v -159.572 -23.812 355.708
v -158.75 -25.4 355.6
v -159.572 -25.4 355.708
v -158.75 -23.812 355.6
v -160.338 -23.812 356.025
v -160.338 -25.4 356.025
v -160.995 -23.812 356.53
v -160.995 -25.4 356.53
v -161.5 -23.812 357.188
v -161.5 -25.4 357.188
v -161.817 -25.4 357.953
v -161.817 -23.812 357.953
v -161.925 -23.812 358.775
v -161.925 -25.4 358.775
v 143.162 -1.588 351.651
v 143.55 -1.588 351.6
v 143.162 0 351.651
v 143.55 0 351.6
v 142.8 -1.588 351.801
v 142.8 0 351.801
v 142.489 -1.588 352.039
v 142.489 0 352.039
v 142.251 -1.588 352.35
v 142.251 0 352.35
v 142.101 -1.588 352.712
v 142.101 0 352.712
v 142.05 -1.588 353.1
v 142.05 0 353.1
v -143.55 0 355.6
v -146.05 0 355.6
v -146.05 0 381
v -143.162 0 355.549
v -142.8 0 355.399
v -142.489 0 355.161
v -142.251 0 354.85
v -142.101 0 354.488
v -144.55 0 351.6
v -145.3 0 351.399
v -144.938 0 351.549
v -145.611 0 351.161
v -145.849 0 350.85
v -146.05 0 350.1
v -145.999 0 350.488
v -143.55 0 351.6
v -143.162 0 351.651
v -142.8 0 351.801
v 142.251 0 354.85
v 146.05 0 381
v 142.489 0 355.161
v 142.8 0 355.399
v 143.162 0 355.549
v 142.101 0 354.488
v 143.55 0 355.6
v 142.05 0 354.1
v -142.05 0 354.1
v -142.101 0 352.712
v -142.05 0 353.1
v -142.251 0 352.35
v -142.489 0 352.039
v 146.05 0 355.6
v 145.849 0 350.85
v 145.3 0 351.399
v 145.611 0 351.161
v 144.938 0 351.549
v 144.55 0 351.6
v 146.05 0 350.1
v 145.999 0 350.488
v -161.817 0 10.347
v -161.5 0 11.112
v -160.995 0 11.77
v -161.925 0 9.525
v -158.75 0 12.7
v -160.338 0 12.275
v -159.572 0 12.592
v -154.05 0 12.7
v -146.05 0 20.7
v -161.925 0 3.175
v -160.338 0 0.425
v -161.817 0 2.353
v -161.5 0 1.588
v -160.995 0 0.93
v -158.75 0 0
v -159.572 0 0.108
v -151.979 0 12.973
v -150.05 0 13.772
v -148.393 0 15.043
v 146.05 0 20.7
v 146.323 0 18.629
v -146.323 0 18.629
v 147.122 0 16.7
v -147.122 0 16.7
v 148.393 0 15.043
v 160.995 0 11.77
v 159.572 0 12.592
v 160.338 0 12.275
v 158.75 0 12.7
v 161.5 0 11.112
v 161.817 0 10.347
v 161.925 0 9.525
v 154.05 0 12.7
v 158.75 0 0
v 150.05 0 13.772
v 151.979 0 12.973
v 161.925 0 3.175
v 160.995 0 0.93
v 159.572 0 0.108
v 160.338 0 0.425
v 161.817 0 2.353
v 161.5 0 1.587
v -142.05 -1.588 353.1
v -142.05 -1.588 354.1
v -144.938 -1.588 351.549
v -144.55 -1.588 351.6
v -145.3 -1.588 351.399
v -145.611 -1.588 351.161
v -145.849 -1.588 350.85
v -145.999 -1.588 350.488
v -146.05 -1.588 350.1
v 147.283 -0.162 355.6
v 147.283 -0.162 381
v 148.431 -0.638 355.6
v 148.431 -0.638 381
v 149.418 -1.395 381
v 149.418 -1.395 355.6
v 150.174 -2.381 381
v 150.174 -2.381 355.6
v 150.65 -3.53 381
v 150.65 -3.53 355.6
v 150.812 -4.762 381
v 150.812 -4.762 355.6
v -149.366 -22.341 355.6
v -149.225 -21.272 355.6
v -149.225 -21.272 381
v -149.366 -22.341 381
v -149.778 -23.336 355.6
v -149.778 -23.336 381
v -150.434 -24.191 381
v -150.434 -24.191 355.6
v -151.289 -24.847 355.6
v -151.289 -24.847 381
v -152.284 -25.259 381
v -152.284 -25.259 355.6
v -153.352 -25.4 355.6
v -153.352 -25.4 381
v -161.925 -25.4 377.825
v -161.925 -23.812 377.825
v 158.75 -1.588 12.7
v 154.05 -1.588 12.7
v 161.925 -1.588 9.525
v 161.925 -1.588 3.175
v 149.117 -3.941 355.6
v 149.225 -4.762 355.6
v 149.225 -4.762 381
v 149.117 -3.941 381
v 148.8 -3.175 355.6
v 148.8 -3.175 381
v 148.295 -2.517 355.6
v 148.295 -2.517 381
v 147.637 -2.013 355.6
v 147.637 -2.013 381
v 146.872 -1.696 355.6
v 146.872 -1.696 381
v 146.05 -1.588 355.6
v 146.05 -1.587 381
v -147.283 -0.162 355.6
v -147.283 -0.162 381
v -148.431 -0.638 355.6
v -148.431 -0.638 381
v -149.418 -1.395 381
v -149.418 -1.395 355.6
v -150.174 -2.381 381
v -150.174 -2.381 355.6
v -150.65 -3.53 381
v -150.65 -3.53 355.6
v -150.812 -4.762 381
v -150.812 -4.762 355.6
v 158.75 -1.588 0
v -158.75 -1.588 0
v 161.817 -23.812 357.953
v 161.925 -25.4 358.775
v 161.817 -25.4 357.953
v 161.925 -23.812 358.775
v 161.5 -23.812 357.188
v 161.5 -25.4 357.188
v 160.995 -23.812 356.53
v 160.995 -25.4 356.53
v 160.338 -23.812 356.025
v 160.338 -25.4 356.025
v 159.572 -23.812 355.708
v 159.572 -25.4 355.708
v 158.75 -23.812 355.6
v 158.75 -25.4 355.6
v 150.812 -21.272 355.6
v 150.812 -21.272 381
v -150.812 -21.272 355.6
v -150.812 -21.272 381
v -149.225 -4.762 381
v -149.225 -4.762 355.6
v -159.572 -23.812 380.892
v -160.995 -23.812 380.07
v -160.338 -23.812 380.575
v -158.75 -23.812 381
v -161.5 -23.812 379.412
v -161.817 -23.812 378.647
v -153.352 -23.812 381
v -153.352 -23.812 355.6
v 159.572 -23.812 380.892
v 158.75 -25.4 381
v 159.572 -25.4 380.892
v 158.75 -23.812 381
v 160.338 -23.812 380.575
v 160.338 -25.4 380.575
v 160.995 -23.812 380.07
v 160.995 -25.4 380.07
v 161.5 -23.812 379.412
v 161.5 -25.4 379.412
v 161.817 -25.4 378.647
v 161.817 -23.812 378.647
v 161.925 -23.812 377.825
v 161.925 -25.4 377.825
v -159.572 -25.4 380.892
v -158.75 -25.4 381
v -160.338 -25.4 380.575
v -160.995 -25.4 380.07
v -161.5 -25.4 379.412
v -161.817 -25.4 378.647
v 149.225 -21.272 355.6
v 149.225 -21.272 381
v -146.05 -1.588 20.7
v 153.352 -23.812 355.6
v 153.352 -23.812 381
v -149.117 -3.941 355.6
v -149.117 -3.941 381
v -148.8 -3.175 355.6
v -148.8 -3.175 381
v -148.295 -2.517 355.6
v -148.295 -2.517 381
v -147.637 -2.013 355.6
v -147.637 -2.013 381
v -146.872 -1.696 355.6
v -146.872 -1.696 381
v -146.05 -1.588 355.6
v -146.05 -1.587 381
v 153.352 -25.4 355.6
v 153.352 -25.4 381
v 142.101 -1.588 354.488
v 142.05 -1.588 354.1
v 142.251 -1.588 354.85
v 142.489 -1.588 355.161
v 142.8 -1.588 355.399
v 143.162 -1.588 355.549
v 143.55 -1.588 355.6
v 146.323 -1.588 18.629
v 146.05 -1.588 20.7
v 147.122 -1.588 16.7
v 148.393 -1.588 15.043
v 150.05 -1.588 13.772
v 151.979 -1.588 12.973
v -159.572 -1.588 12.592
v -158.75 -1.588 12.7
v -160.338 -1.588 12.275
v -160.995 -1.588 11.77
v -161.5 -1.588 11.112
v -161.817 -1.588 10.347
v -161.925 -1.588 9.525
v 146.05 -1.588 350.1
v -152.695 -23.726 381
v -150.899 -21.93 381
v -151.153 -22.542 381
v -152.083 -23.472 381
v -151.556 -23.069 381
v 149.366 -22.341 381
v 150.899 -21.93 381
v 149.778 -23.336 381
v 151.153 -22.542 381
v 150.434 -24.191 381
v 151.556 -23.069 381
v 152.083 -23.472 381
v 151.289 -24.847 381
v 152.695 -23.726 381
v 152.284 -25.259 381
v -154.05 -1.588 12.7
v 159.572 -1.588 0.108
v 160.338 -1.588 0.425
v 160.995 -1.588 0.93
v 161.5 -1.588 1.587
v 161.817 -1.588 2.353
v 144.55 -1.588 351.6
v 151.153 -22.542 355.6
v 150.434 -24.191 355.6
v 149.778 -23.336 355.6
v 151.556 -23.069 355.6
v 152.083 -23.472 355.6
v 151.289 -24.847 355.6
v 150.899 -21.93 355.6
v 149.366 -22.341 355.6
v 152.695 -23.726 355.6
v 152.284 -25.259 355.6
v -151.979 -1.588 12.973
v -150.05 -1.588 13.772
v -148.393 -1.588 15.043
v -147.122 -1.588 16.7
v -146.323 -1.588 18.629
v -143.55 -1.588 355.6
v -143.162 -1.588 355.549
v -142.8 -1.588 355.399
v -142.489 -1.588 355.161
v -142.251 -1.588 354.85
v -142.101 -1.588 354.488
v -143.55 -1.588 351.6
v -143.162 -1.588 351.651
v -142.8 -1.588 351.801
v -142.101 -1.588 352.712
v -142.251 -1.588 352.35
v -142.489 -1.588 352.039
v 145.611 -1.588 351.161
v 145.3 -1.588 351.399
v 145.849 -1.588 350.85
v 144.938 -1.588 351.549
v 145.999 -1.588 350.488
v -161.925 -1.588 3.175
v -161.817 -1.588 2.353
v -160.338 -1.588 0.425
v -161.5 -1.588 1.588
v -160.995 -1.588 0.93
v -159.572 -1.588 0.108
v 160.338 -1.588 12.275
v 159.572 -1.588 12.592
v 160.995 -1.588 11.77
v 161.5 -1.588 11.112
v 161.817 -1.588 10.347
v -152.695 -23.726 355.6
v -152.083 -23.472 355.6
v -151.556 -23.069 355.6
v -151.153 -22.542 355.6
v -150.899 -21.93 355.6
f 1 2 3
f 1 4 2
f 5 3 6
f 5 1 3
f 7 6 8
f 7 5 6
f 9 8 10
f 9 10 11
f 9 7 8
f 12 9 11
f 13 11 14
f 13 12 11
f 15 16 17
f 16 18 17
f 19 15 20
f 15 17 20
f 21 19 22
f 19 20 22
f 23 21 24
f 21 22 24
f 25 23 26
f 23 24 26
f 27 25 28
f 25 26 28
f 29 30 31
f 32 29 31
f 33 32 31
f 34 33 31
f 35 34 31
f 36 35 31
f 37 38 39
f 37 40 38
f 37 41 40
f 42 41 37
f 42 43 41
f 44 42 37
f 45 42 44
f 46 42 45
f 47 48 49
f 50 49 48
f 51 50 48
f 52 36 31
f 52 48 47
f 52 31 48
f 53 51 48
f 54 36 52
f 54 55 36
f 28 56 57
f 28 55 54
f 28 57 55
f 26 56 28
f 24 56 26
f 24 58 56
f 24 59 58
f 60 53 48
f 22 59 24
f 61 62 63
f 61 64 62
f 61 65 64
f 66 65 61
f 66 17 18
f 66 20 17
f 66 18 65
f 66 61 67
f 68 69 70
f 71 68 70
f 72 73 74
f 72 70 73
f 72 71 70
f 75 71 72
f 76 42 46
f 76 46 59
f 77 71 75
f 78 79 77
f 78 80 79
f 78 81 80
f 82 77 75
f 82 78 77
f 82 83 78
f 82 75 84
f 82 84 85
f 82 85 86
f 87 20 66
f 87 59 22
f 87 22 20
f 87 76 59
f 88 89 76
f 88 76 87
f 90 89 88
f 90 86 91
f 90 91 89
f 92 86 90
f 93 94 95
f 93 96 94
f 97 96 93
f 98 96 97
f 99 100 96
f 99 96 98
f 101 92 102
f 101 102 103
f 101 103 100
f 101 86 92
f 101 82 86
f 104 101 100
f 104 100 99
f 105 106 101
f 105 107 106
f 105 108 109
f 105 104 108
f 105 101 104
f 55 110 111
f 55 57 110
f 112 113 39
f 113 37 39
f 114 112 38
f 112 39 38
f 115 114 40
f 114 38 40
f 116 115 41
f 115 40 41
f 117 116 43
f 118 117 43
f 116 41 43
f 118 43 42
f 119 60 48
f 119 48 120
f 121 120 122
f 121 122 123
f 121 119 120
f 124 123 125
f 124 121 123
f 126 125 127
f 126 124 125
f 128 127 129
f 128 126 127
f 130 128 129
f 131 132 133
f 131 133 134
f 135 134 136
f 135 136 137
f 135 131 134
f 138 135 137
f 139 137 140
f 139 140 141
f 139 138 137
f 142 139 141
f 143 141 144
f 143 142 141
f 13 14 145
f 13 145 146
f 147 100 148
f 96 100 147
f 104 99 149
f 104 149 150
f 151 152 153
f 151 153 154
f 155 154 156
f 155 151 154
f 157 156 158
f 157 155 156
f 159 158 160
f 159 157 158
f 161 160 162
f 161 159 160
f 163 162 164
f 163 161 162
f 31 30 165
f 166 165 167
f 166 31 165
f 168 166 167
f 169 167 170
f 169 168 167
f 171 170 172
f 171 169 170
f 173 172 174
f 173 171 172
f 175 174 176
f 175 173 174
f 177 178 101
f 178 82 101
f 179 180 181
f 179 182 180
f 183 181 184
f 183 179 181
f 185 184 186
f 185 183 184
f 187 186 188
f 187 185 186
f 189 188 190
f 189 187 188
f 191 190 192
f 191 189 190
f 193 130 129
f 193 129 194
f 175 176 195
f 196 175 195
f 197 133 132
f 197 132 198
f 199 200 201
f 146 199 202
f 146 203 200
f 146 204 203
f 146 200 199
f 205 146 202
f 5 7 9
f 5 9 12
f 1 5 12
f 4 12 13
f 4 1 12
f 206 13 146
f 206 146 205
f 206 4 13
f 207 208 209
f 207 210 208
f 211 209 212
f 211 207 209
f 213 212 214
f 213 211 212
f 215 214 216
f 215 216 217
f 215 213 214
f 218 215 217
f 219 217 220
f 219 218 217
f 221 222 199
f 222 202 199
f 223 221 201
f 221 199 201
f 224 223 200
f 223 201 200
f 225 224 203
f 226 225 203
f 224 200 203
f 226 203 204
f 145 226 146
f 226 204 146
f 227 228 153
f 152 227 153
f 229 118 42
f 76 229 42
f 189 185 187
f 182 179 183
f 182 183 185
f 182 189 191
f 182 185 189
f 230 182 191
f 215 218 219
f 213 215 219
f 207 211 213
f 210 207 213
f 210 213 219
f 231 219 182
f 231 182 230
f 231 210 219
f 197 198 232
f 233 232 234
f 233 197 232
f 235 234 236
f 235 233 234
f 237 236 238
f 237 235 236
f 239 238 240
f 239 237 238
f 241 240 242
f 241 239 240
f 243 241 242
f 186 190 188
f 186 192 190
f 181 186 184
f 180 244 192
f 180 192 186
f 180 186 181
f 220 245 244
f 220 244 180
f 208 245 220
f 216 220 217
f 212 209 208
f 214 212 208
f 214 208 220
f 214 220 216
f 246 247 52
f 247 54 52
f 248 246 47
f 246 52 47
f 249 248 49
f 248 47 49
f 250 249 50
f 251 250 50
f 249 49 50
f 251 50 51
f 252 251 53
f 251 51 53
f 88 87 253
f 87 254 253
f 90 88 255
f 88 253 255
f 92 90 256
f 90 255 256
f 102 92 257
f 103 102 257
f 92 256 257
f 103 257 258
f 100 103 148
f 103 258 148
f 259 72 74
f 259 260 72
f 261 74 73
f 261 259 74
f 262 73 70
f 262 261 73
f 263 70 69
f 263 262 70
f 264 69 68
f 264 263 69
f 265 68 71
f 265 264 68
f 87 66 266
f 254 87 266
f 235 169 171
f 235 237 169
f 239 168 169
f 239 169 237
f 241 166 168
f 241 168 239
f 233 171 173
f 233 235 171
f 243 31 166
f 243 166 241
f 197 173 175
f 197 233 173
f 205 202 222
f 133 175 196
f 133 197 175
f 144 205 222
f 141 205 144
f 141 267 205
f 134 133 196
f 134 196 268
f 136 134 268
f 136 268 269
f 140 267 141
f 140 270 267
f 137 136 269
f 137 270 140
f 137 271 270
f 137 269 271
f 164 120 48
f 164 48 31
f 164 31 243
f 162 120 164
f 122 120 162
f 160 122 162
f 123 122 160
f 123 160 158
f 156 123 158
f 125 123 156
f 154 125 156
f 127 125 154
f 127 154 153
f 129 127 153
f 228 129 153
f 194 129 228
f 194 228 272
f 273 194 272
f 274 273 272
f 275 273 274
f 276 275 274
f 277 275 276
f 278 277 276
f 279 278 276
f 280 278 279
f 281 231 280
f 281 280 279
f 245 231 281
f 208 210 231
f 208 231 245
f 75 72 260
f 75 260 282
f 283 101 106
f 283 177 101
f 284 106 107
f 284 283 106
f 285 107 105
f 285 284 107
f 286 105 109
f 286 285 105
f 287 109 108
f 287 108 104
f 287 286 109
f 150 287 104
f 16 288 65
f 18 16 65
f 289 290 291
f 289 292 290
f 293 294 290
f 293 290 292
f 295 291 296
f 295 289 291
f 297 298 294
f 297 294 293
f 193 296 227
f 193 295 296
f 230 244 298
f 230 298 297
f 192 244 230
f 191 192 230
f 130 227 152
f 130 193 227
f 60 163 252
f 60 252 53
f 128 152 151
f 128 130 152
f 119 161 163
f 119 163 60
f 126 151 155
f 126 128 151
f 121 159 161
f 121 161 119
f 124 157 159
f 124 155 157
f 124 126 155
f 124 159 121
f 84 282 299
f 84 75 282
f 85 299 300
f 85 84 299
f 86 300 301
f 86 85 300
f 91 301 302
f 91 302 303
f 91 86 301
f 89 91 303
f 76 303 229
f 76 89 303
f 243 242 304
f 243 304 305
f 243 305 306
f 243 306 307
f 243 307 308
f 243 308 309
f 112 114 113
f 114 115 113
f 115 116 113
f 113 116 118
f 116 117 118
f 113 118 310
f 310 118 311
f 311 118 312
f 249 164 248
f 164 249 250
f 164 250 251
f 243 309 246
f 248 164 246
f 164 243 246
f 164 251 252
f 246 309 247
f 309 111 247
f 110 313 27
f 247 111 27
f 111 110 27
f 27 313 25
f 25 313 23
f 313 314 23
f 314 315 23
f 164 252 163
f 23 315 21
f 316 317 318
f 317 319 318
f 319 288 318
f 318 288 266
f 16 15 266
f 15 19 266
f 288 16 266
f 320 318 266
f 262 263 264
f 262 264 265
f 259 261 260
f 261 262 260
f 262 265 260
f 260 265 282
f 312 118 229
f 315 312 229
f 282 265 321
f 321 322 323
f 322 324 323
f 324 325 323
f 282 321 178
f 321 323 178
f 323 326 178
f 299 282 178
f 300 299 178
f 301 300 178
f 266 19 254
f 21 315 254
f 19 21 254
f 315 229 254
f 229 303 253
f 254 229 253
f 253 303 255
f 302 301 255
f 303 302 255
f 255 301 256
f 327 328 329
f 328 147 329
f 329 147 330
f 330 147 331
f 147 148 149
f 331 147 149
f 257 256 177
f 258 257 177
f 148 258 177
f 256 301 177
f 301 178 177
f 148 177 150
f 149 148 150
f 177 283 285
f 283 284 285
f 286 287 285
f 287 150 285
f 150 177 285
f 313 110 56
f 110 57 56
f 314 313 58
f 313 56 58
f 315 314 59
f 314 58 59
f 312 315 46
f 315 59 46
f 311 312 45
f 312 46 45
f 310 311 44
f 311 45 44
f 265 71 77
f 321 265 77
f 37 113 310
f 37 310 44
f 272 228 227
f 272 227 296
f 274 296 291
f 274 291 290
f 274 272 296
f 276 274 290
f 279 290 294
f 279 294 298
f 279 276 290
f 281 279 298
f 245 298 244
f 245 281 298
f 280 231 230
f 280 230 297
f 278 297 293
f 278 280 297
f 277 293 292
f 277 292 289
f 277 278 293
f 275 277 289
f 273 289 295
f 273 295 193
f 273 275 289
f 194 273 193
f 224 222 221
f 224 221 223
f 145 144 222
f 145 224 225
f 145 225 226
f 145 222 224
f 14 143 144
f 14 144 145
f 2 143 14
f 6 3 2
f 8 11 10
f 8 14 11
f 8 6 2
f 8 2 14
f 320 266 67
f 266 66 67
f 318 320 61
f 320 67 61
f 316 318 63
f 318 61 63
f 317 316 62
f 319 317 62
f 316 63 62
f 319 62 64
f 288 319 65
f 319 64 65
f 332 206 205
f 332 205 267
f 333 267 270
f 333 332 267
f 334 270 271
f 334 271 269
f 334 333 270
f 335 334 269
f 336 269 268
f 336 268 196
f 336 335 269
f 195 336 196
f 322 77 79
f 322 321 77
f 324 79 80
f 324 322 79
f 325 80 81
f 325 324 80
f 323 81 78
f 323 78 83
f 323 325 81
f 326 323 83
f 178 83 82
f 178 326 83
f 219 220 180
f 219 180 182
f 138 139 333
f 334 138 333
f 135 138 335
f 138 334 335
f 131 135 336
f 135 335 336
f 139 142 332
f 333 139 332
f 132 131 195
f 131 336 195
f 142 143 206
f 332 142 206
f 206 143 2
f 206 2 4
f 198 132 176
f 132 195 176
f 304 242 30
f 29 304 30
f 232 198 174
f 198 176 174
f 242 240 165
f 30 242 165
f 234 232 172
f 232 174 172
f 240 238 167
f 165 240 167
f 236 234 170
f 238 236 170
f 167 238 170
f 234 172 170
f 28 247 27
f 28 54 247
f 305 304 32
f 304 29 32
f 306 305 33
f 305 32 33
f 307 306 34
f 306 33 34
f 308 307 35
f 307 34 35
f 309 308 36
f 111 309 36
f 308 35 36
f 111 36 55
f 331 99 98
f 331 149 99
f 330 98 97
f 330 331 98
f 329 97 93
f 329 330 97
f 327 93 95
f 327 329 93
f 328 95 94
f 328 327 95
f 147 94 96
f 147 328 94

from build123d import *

# Parameters (mm, degrees)
SKETCH5_W                      = 301.625
SKETCH5_H                      = 1.5875
BASE_FLANGE1_DEPTH             = 381
SKETCH10_W                     = 11.1125
SKETCH10_H                     = 12.7
BOSS_EXTRUDE1_DEPTH            = 1.5875
EDGE_FLANGE1_STRIP_W           = 12.7
EDGE_FLANGE1_STRIP_H           = 1.5875
EDGE_FLANGE1_STRIP_CUT_DEPTH   = 368.3
EDGE_FLANGE1_STRIP_2_W         = 12.7
EDGE_FLANGE1_STRIP_2_H         = 1.5875
EDGE_FLANGE1_STRIP_CUT_2_DEPTH = 368.3
EDGE_FLANGE1_DEPTH             = 368.3
EDGE_FLANGE1_BEND_DEPTH        = 368.3
CUT_EXTRUDE1_START             = -25.4
CUT_EXTRUDE1_DEPTH             = 342.9
EDGE_FLANGE2_STRIP_W           = 11.43
EDGE_FLANGE2_STRIP_H           = 1.5875
EDGE_FLANGE2_STRIP_CUT_DEPTH   = 25.4
EDGE_FLANGE2_DEPTH             = 25.4
EDGE_FLANGE3_STRIP_W           = 11.43
EDGE_FLANGE3_STRIP_H           = 1.5875
EDGE_FLANGE3_STRIP_CUT_DEPTH   = 25.4
EDGE_FLANGE3_DEPTH             = 25.4
FILLET1_R                      = 8
FILLET2_R                      = 3.175
SKETCH30_W                     = 4
SKETCH30_H                     = 1.5875
CUT_EXTRUDE9_DEPTH             = 4
SKETCH31_W                     = 4
SKETCH31_H                     = 1.5875
CUT_EXTRUDE10_DEPTH            = 4
FILLET4_R                      = 1.5


# Sheet-metal steps are written as plain solids
with BuildPart() as part:
    # Sketch5 → Base-Flange1 (new body)
    with BuildSketch(Plane.XY):
        with Locations((0, -0.79375)):
            Rectangle(SKETCH5_W, SKETCH5_H)
    extrude(amount=BASE_FLANGE1_DEPTH)

    # Sketch10 → Boss-Extrude1 (add)
    with BuildSketch(Plane(origin=(0, 0, 0), x_dir=(1, 0, 0), z_dir=(0, 1, 0))):
        with Locations((-156.36875, -6.35)):
            Rectangle(SKETCH10_W, SKETCH10_H)
        with Locations((156.36875, -6.35)):
            Rectangle(SKETCH10_W, SKETCH10_H)
    extrude(amount=-BOSS_EXTRUDE1_DEPTH)

    # Edge-Flange1 strip (across the edge) → Edge-Flange1 strip cut (cut)
    with BuildSketch(Plane(origin=(150.8125, -1.5875, 12.7), x_dir=(-1, 0, 0), z_dir=(0, 0, 1))):
        with Locations((-1.5875, -0.79375)):
            Rectangle(EDGE_FLANGE1_STRIP_W, EDGE_FLANGE1_STRIP_H)
    extrude(amount=EDGE_FLANGE1_STRIP_CUT_DEPTH, mode=Mode.SUBTRACT)

    # Edge-Flange1 strip 2 (across the edge) → Edge-Flange1 strip cut 2 (cut)
    with BuildSketch(Plane(origin=(-150.8125, -1.5875, 381), x_dir=(1, 0, 0), z_dir=(0, 0, -1))):
        with Locations((-1.5875, -0.79375)):
            Rectangle(EDGE_FLANGE1_STRIP_2_W, EDGE_FLANGE1_STRIP_2_H)
    extrude(amount=EDGE_FLANGE1_STRIP_CUT_2_DEPTH, mode=Mode.SUBTRACT)

    # Edge-Flange1 section (across the edge) → Edge-Flange1 (add)
    with BuildSketch(Plane(origin=(150.8125, -1.5875, 12.7), x_dir=(-1, 0, 0), z_dir=(0, 0, 1))):
        with BuildLine():
            Line((0, 3.175), (0, 23.8125))
            Line((0, 23.8125), (1.5875, 23.8125))
            Line((1.5875, 23.8125), (1.5875, 3.175))
            ThreePointArc((1.5875, 3.175), (2.51743597, 0.92993597), (4.7625, 0))
            Line((4.7625, 0), (4.7625, -1.5875))
            ThreePointArc((4.7625, -1.5875), (1.394903955, -0.192596045), (0, 3.175))
        make_face()
    extrude(amount=EDGE_FLANGE1_DEPTH)

    # Edge-Flange1 section 2 (across the edge) → Edge-Flange1 bend (add)
    with BuildSketch(Plane(origin=(-150.8125, -1.5875, 381), x_dir=(1, 0, 0), z_dir=(0, 0, -1))):
        with BuildLine():
            Line((0, 3.175), (0, 23.8125))
            Line((0, 23.8125), (1.5875, 23.8125))
            Line((1.5875, 23.8125), (1.5875, 3.175))
            ThreePointArc((1.5875, 3.175), (2.51743597, 0.92993597), (4.7625, 0))
            Line((4.7625, 0), (4.7625, -1.5875))
            ThreePointArc((4.7625, -1.5875), (1.394903955, -0.192596045), (0, 3.175))
        make_face()
    extrude(amount=EDGE_FLANGE1_BEND_DEPTH)

    # Sketch20 → Cut-Extrude1 (cut)
    with BuildSketch(Plane.XY.offset(381).offset(CUT_EXTRUDE1_START)):
        with BuildLine():
            Line((-150.8125, -4.7625), (-150.8125, -25.4))
            Line((-150.8125, -25.4), (-149.225, -25.4))
            Line((-149.225, -25.4), (-149.225, -4.7625))
            ThreePointArc((-149.225, -4.7625), (-148.29506403, -2.51743597), (-146.05, -1.5875))
            Line((-146.05, -1.5875), (-146.05, 0))
            ThreePointArc((-146.05, 0), (-149.417596045, -1.394903955), (-150.8125, -4.7625))
        make_face()
        with BuildLine():
            Line((149.225, -4.7625), (149.225, -25.4))
            Line((149.225, -25.4), (150.8125, -25.4))
            Line((150.8125, -25.4), (150.8125, -4.7625))
            ThreePointArc((150.8125, -4.7625), (149.417596045, -1.394903955), (146.05, 0))
            Line((146.05, 0), (146.05, -1.5875))
            ThreePointArc((146.05, -1.5875), (148.29506403, -2.51743597), (149.225, -4.7625))
        make_face()
    extrude(amount=-CUT_EXTRUDE1_DEPTH, mode=Mode.SUBTRACT)

    # Edge-Flange2 strip (across the edge) → Edge-Flange2 strip cut (cut)
    with BuildSketch(Plane(origin=(-150.8125, -25.4, 355.6), x_dir=(0, 1, 0), z_dir=(0, 0, 1))):
        with Locations((-1.5875, -0.79375)):
            Rectangle(EDGE_FLANGE2_STRIP_W, EDGE_FLANGE2_STRIP_H)
    extrude(amount=EDGE_FLANGE2_STRIP_CUT_DEPTH, mode=Mode.SUBTRACT)

    # Edge-Flange2 section (across the edge) → Edge-Flange2 (add)
    with BuildSketch(Plane(origin=(-150.8125, -25.4, 355.6), x_dir=(0, 1, 0), z_dir=(0, 0, 1))):
        with BuildLine():
            Line((0, 2.54), (0, 11.1125))
            Line((0, 11.1125), (1.5875, 11.1125))
            Line((1.5875, 11.1125), (1.5875, 2.54))
            ThreePointArc((1.5875, 2.54), (2.331448776, 0.743948776), (4.1275, 0))
            Line((4.1275, 0), (4.1275, -1.5875))
            ThreePointArc((4.1275, -1.5875), (1.208916761, -0.378583239), (0, 2.54))
        make_face()
    extrude(amount=EDGE_FLANGE2_DEPTH)

    # Edge-Flange3 strip (across the edge) → Edge-Flange3 strip cut (cut)
    with BuildSketch(Plane(origin=(150.8125, -25.4, 381), x_dir=(0, 1, 0), z_dir=(0, 0, -1))):
        with Locations((-1.5875, -0.79375)):
            Rectangle(EDGE_FLANGE3_STRIP_W, EDGE_FLANGE3_STRIP_H)
    extrude(amount=EDGE_FLANGE3_STRIP_CUT_DEPTH, mode=Mode.SUBTRACT)

    # Edge-Flange3 section (across the edge) → Edge-Flange3 (add)
    with BuildSketch(Plane(origin=(150.8125, -25.4, 381), x_dir=(0, 1, 0), z_dir=(0, 0, -1))):
        with BuildLine():
            Line((0, 2.54), (0, 11.1125))
            Line((0, 11.1125), (1.5875, 11.1125))
            Line((1.5875, 11.1125), (1.5875, 2.54))
            ThreePointArc((1.5875, 2.54), (2.331448776, 0.743948776), (4.1275, 0))
            Line((4.1275, 0), (4.1275, -1.5875))
            ThreePointArc((4.1275, -1.5875), (1.208916761, -0.378583239), (0, 2.54))
        make_face()
    extrude(amount=EDGE_FLANGE3_DEPTH)

    # Fillet1
    fillet1_edges = [part.edges().sort_by_distance(p)[0] for p in [
        (-146.05, -0.79375, 12.7),
        (146.05, -0.79375, 12.7),
    ]]
    fillet(fillet1_edges, radius=FILLET1_R)

    # Fillet2
    fillet2_edges = [part.edges().sort_by_distance(p)[0] for p in [
        (-161.925, -0.79375, 12.7),
        (-161.925, -0.79375, 0),
        (-161.925, -24.60625, 355.6),
        (-161.925, -24.60625, 381),
        (161.925, -24.60625, 381),
        (161.925, -24.60625, 355.6),
        (161.925, -0.79375, 0),
        (161.925, -0.79375, 12.7),
    ]]
    fillet(fillet2_edges, radius=FILLET2_R)

    # Sketch30 → Cut-Extrude9 (cut)
    with BuildSketch(Plane.ZY.offset(146.05)):
        with Locations((353.6, -0.79375)):
            Rectangle(SKETCH30_W, SKETCH30_H)
    extrude(amount=-CUT_EXTRUDE9_DEPTH, mode=Mode.SUBTRACT)

    # Sketch31 → Cut-Extrude10 (cut)
    with BuildSketch(Plane(origin=(146.05, 0, 0), x_dir=(0, 0, -1), z_dir=(1, 0, 0))):
        with Locations((-353.6, -0.79375)):
            Rectangle(SKETCH31_W, SKETCH31_H)
    extrude(amount=-CUT_EXTRUDE10_DEPTH, mode=Mode.SUBTRACT)

    # Fillet4
    fillet4_edges = [part.edges().sort_by_distance(p)[0] for p in [
        (-146.05, -0.79375, 351.6),
        (-142.05, -0.79375, 351.6),
        (-142.05, -0.79375, 355.6),
        (146.05, -0.79375, 351.6),
        (142.05, -0.79375, 351.6),
        (142.05, -0.79375, 355.6),
    ]]
    fillet(fillet4_edges, radius=FILLET4_R)


solid = part.part
